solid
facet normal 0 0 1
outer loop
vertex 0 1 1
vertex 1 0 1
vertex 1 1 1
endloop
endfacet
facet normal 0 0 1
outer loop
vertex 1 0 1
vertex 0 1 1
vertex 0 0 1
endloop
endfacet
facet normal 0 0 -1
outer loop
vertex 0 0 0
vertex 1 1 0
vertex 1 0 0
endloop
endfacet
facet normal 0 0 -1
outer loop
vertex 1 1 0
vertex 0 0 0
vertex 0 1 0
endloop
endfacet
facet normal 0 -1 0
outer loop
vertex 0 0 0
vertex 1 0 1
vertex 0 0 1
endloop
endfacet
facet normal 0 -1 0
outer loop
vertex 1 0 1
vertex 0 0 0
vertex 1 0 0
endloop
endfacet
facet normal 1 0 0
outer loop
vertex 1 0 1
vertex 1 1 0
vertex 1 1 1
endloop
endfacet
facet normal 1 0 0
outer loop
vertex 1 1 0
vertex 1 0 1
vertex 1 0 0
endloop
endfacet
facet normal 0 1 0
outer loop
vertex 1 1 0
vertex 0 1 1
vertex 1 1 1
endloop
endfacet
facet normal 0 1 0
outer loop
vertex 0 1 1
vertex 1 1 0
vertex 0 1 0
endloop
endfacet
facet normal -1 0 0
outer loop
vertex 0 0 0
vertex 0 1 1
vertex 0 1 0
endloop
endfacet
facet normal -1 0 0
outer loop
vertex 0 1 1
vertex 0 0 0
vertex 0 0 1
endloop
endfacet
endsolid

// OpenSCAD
// translate([1, 0, 0])
//   union() {
//     cube(1);
//     cube(2);
//   }
// cube(3);

group() group() cube();
// translate([1, 0, 0]) translate([1, 1, 0]) cube();

// translate([0.5, 0, 0])
